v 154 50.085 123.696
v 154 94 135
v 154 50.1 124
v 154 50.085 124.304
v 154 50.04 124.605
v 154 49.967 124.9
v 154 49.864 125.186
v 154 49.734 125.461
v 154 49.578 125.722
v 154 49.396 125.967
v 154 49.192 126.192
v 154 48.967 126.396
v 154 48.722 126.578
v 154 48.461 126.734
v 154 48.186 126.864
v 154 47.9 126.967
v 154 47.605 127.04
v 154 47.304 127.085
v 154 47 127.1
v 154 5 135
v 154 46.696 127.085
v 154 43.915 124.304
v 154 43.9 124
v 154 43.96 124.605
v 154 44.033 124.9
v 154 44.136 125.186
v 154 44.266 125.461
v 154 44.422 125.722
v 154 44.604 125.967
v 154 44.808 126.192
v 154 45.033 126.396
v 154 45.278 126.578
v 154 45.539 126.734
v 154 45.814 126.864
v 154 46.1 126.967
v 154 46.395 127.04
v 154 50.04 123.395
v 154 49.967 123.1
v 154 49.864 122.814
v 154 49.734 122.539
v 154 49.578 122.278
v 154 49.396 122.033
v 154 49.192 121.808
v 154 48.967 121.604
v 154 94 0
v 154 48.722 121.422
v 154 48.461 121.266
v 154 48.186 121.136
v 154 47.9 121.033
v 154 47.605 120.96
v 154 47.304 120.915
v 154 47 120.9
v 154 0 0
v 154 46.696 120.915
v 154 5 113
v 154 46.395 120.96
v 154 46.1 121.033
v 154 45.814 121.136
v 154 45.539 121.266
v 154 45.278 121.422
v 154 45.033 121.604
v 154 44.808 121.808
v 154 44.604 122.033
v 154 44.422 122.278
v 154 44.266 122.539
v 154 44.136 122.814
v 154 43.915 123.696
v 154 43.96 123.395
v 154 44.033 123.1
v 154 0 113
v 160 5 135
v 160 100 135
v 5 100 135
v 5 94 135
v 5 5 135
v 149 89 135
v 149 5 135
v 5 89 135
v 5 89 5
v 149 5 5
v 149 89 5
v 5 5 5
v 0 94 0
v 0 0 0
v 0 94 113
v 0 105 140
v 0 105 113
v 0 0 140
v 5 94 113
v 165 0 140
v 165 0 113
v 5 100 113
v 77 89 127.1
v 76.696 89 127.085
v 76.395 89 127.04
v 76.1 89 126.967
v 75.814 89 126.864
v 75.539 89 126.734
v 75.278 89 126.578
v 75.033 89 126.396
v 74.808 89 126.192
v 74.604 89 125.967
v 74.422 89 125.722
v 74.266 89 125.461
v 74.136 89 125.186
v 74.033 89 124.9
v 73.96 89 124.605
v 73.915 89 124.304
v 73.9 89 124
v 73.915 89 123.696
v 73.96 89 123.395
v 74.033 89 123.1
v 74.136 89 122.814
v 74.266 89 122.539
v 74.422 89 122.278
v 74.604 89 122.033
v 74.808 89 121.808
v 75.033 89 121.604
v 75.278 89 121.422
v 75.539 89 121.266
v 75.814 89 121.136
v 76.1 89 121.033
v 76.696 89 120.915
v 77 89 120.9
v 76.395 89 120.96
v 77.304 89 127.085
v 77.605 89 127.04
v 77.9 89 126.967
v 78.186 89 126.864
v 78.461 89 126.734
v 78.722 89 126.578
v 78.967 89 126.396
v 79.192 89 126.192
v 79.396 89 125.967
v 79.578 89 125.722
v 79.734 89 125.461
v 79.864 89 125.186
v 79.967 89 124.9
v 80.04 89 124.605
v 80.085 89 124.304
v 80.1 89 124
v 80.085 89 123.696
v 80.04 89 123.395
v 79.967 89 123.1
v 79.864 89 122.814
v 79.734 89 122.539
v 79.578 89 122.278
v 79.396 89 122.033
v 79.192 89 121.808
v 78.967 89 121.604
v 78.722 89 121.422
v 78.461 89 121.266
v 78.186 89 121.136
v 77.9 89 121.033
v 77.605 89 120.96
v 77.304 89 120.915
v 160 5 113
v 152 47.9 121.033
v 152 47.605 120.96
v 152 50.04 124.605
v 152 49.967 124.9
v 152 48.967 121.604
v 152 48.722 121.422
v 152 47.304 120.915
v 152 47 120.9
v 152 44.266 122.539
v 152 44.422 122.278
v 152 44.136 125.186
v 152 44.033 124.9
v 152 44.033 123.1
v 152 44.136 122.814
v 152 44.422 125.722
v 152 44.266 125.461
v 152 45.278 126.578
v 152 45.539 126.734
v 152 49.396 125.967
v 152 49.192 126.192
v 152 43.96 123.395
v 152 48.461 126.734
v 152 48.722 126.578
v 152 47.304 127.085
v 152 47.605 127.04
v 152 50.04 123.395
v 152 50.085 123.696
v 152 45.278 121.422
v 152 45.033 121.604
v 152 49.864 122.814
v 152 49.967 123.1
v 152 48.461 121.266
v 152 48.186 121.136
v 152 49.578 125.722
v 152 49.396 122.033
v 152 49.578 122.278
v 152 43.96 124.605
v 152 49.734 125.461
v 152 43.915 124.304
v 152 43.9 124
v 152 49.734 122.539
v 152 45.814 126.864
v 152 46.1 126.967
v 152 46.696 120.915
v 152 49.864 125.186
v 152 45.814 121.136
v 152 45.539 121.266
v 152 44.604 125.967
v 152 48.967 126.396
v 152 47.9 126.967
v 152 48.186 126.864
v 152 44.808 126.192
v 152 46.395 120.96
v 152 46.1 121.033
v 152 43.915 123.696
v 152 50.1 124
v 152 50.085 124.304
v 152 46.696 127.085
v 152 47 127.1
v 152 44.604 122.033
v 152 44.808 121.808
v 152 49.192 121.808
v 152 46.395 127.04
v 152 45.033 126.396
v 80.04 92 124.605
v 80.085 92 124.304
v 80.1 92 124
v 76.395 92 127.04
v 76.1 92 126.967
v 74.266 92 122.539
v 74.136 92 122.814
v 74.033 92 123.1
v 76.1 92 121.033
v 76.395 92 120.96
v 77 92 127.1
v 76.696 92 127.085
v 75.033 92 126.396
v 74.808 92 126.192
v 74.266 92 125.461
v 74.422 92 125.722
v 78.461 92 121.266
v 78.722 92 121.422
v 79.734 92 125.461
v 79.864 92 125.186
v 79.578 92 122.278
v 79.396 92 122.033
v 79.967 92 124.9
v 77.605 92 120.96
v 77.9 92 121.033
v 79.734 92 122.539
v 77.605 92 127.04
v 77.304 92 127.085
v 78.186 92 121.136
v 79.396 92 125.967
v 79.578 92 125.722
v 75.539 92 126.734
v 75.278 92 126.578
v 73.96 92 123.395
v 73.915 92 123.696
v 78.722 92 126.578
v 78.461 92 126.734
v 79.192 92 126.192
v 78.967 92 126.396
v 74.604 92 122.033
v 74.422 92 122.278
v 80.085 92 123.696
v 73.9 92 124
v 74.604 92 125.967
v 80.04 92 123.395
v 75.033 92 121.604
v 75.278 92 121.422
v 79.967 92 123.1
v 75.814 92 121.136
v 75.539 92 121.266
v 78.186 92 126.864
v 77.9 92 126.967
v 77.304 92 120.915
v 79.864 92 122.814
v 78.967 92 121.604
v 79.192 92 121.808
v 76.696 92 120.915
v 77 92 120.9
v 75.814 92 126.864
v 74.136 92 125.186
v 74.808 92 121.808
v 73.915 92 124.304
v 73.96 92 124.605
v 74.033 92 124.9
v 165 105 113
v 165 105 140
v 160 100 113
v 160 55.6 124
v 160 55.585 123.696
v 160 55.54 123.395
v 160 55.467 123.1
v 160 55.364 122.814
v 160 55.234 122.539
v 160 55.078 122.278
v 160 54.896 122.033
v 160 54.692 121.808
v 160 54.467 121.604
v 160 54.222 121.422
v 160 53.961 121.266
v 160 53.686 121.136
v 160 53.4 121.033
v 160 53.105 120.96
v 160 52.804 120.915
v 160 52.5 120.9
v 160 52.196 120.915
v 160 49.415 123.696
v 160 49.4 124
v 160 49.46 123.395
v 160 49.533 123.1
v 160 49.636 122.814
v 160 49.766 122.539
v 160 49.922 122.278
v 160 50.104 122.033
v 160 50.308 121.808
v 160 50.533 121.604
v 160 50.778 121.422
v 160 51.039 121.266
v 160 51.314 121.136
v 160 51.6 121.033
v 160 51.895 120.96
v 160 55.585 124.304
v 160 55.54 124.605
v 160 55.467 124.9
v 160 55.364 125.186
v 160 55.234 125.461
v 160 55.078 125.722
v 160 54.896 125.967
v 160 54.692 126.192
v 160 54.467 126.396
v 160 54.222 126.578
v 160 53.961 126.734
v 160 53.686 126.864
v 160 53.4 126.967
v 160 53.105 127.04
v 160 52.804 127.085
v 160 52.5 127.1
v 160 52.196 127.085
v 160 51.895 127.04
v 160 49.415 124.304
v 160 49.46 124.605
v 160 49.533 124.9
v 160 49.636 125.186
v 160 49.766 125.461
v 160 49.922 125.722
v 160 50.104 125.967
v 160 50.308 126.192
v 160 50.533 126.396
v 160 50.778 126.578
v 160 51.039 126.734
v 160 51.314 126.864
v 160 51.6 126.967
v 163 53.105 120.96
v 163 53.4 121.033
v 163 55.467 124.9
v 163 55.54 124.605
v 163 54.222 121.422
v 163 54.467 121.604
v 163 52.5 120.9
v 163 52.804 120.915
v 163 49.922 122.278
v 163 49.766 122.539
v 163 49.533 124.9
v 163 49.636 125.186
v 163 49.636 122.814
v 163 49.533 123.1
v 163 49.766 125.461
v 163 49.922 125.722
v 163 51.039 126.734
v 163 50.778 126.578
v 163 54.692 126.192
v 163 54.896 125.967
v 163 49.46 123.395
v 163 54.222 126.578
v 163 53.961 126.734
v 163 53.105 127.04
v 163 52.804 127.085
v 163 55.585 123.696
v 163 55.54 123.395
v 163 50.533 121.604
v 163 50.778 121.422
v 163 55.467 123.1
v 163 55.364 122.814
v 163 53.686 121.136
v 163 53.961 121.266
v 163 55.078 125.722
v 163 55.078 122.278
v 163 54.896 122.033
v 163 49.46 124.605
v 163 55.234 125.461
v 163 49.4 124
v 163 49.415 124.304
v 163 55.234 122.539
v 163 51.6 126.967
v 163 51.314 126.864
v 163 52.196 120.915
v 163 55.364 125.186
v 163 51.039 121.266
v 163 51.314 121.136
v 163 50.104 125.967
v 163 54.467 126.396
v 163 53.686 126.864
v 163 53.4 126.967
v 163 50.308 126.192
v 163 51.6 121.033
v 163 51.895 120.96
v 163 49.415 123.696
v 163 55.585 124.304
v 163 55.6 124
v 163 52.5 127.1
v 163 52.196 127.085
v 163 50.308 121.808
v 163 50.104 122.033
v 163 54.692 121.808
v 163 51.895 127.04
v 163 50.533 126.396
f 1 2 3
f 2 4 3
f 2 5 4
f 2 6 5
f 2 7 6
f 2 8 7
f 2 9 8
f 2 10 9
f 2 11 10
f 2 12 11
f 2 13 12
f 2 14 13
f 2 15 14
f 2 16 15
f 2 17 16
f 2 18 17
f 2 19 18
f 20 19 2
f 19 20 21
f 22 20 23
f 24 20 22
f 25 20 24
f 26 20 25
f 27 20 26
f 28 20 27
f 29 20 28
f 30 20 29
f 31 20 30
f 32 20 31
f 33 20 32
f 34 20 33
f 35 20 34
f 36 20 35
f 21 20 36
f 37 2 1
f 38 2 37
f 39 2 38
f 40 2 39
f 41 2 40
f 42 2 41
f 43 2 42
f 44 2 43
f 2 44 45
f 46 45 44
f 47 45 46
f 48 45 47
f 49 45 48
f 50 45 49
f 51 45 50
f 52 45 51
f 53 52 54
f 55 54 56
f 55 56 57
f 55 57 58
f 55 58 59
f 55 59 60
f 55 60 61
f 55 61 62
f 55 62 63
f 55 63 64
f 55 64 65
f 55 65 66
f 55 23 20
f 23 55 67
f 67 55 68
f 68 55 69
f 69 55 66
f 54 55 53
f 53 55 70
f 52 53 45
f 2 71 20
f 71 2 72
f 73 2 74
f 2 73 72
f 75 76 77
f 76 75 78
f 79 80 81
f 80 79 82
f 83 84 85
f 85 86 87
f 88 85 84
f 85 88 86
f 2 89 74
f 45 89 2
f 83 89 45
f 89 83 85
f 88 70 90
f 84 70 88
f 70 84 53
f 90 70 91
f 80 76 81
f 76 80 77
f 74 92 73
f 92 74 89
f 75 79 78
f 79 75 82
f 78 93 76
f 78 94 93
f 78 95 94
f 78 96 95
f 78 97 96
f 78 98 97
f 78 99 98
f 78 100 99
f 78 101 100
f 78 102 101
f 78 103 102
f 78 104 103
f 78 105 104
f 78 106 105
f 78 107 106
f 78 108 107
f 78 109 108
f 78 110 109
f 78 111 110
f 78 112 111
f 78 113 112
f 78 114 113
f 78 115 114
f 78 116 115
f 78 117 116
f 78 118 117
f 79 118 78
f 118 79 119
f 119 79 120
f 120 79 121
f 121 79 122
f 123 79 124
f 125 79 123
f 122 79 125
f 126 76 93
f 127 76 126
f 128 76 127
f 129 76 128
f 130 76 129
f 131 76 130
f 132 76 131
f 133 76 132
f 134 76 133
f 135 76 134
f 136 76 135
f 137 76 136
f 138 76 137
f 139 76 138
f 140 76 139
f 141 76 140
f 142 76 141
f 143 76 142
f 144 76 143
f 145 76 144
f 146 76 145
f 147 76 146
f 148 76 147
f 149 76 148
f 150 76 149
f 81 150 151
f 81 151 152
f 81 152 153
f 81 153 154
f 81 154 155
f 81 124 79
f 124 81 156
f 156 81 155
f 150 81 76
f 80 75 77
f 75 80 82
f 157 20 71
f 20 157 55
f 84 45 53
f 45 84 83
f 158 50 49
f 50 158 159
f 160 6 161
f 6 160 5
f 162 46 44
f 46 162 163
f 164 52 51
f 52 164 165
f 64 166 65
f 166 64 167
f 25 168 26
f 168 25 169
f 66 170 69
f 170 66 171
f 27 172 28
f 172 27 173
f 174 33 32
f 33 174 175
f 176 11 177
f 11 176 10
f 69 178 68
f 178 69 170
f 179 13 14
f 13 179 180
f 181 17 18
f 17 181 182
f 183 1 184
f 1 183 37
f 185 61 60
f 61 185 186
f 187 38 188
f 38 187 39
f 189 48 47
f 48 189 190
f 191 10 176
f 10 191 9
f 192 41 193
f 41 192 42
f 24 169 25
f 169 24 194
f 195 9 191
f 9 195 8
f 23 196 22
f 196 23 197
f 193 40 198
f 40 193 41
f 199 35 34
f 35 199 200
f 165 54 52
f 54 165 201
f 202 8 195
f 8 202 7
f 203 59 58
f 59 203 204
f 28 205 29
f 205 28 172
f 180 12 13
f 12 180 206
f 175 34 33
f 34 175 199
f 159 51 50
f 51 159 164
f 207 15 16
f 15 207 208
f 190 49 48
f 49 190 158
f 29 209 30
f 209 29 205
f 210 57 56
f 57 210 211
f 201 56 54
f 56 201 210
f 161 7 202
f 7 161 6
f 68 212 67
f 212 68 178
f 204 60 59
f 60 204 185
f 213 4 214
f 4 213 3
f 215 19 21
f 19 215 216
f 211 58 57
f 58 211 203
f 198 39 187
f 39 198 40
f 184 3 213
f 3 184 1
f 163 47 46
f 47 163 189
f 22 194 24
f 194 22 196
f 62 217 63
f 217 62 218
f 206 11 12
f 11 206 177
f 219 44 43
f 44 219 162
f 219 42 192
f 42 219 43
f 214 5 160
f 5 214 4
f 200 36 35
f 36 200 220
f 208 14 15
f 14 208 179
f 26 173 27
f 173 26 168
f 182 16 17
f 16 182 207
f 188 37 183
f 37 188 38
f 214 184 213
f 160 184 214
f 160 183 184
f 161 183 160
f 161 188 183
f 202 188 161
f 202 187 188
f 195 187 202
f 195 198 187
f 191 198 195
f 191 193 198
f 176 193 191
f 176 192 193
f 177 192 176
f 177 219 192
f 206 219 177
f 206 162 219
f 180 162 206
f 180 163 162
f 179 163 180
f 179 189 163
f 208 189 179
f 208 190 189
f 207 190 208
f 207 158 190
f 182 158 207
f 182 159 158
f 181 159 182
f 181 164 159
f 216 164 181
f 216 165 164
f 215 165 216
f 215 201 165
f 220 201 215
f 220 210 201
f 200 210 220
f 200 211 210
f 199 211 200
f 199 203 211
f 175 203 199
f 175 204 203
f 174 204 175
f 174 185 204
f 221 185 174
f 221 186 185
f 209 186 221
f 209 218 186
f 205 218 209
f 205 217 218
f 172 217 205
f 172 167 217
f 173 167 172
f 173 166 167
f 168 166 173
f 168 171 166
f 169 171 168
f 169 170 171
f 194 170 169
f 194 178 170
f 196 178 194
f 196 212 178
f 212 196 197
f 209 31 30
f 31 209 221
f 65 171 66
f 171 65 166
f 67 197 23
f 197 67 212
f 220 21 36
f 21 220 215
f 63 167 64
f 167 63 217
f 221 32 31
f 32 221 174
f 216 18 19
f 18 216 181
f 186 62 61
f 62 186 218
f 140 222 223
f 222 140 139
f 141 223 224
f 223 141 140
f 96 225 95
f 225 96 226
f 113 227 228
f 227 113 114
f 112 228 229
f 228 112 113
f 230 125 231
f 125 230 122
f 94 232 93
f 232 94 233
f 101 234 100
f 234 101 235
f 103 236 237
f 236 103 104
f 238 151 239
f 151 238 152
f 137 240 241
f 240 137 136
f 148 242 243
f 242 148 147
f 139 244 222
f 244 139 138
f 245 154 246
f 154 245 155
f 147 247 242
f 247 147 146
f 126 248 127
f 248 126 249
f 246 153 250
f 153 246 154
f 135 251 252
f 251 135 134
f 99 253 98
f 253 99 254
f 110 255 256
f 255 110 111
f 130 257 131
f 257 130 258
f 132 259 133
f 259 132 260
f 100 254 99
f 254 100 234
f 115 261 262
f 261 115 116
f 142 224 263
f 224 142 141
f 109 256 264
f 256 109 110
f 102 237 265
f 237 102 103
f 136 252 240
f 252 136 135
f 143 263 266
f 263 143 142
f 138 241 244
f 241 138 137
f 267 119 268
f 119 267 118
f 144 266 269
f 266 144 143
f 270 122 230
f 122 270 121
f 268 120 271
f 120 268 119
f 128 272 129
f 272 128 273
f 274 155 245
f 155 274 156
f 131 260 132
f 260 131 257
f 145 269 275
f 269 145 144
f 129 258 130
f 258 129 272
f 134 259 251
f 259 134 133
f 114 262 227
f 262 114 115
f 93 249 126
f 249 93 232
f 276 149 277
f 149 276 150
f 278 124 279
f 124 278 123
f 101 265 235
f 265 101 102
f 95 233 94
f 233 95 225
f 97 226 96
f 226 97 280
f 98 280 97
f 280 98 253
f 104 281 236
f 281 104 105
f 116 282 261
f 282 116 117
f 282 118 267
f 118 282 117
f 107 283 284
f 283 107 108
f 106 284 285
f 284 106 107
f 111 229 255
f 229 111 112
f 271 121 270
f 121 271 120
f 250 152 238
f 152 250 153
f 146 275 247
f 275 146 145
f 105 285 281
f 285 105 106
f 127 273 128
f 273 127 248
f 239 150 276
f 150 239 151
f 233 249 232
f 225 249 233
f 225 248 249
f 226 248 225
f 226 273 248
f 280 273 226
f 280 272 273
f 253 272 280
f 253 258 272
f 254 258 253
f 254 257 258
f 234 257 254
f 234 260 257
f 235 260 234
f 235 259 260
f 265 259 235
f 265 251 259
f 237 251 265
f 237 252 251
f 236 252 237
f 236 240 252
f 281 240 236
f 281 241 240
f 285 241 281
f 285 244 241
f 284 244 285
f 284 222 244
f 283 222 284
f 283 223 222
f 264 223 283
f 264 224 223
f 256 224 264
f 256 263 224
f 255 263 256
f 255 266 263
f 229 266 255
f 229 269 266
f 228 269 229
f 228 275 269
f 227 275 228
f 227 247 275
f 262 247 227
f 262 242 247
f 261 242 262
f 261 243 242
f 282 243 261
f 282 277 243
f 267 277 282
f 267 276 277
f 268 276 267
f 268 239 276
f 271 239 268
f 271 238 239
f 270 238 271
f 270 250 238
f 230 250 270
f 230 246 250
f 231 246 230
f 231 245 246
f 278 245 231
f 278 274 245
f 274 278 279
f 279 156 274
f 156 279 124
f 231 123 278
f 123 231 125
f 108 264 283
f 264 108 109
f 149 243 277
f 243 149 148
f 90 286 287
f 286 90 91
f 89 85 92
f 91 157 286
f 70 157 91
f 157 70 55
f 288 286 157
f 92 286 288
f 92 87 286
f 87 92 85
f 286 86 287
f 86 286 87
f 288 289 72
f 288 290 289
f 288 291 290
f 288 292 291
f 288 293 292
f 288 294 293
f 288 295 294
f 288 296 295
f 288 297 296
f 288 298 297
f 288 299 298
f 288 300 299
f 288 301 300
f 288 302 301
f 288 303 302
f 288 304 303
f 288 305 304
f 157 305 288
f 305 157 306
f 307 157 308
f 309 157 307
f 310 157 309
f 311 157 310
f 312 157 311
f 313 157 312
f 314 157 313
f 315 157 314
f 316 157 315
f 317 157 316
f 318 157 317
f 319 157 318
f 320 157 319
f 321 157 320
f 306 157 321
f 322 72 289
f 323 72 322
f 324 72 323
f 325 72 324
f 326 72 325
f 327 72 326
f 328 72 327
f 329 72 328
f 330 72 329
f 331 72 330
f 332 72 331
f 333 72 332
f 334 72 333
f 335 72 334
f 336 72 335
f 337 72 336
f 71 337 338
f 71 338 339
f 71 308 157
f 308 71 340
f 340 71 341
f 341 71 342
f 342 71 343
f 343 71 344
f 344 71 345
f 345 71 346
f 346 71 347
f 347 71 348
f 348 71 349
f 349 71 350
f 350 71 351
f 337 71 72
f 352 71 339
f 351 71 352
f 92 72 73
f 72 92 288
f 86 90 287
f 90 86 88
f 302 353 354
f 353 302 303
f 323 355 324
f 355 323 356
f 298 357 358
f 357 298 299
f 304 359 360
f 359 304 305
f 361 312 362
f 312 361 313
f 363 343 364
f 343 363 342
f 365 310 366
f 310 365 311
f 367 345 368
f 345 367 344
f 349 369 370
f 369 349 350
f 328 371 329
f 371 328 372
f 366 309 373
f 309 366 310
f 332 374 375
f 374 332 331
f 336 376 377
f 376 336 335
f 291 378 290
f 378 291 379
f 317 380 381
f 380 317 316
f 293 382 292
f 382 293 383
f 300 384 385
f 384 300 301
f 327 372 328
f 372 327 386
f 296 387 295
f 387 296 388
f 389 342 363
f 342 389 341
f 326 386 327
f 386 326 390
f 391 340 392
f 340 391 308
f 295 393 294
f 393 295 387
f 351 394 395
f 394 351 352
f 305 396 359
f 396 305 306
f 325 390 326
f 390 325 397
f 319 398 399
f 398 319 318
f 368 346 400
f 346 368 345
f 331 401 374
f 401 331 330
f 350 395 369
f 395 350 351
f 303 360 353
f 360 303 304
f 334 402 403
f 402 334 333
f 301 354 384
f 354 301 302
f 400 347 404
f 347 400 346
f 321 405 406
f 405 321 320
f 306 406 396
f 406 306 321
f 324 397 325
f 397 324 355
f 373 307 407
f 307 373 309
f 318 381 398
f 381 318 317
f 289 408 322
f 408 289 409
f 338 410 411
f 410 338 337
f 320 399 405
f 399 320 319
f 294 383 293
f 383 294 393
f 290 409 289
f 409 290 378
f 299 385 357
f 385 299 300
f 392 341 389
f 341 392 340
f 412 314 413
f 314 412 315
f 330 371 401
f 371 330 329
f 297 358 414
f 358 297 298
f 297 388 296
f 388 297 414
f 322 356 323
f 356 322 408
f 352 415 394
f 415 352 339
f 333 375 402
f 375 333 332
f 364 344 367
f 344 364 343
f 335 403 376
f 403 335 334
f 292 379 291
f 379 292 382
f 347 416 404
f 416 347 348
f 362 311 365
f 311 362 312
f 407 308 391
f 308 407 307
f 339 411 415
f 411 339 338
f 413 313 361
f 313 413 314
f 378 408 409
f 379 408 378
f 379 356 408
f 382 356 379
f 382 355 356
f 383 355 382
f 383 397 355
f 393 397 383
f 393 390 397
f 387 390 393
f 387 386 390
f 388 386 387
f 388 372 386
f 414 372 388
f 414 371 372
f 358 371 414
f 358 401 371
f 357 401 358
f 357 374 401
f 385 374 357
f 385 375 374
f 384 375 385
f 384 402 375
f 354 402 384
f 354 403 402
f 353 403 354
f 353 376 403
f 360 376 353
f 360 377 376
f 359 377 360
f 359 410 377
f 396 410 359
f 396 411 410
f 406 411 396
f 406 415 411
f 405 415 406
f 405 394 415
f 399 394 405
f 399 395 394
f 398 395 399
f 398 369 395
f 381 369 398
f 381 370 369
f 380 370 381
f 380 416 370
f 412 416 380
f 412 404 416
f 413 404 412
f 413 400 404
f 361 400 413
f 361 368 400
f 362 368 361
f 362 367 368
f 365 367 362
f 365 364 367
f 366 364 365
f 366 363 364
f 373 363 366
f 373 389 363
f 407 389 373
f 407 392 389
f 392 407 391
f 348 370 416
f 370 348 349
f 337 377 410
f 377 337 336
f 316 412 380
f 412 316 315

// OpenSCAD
// =============================================================================
//  Pokemon Booster Box Display Case  --  magnetic slip-on cap lid
//  Parametric OpenSCAD model.  Units: millimetres.
//
//  HOW TO USE
//    1. Measure your sealed booster box (outer cardboard, in mm).
//    2. Put those three numbers in BOX_W / BOX_D / BOX_H below.
//    3. Press F5 to preview, F6 to render.  The console echoes the cut list.
//
//  See ../SPEC.md for the matching written spec and ../cut-plan.svg for the
//  flat sheet layout.
// =============================================================================

/* [Booster box - MEASURE YOURS] */
BOX_W = 140;    // width  (X)
BOX_D =  80;    // depth  (Y)
BOX_H = 125;    // height (Z)

/* [Clearance] */
FIT       = 2.0;   // air each side of the booster box
HEAD      = 5.0;   // headroom above the booster box
LID_CLR   = 0.5;   // lid-to-body clearance, each side

/* [Material] */
t = 5.0;           // acrylic thickness (body walls, bottom, lid)

/* [Lid] */
SKIRT       = 22.0;  // how far the lid skirt drops over the body
SKIRT_SHORT = 0;     // 0 = same as SKIRT; set 18 for a finger reveal on the
                     // two short sides

/* [Magnets] */
MAG_ON       = true;
MAG_DIA      = 6.2;   // pocket diameter (0.2 mm over the magnet)
MAG_DEPTH    = 2.0;   // blind pocket depth -- keep <= t - 3
MAG_INSET    = 11.0;  // pocket centre, measured down from the top rim
MAG_PER_WALL = 1;     // 1 = one centred magnet per wall; 2 = two per wall
MAG_SPREAD   = 40.0;  // centre spacing when MAG_PER_WALL = 2

/* [Details] */
FINGER_NOTCH = false;  // scallop in the body's front top edge
NOTCH_DIA    = 25.0;
NOTCH_DEPTH  = 5.0;

/* [View] */
SHOW_LID     = true;   // draw the lid
SHOW_MAGNETS = false;  // red = body magnets, blue = lid magnets
EXPLODE      = 0;      // mm to lift the lid for a preview render
SHOW_GHOST   = false;  // translucent stand-in for the booster box

$fn = 64;

// ---------------------------------------------------------------- derived ----
Ix  = BOX_W + 2*FIT;          // interior width
Iy  = BOX_D + 2*FIT;          // interior depth
Iz  = BOX_H + HEAD;           // interior height (bottom-panel top -> rim)

Ox  = Ix + 2*t;               // body outer width
Oy  = Iy + 2*t;               // body outer depth
Oz  = t + Iz;                 // body outer height

L_ix = Ox + 2*LID_CLR;        // lid skirt inner width
L_iy = Oy + 2*LID_CLR;        // lid skirt inner depth
L_ox = L_ix + 2*t;            // lid outer width
L_oy = L_iy + 2*t;            // lid outer depth
L_hz = t + SKIRT;             // lid total height

SS    = (SKIRT_SHORT > 0 && SKIRT_SHORT < SKIRT) ? SKIRT_SHORT : SKIRT;
LID_Z = Oz - SKIRT;           // lid origin: skirt bottom sits here

echo(str("Interior         : ", Ix, " x ", Iy, " x ", Iz));
echo(str("Body outer       : ", Ox, " x ", Oy, " x ", Oz));
echo(str("Lid outer        : ", L_ox, " x ", L_oy, " x ", L_hz));
echo(str("Assembled height : ", Oz + t));
echo(str("--- CUT LIST (", t, " mm acrylic) ---"));
echo(str("  Bottom         : ", Ox, " x ", Oy, "   x1"));
echo(str("  Front/back wall: ", Ox, " x ", Iz, "   x2"));
echo(str("  Left/right wall: ", Iy, " x ", Iz, "   x2"));
echo(str("  Lid top        : ", L_ox, " x ", L_oy, "   x1"));
echo(str("  Lid skirt F/B  : ", L_ox, " x ", SKIRT, "   x2"));
echo(str("  Lid skirt L/R  : ", L_iy, " x ", SS, "   x2"));
echo(str("  Magnet pockets : d", MAG_DIA, " x ", MAG_DEPTH, " deep, ",
         4*MAG_PER_WALL, " off, ", MAG_INSET, " mm below the rim"));

// symmetric magnet centre offsets along each wall
function offsets() =
  MAG_PER_WALL <= 1 ? [0]
  : [ for (i = [0 : MAG_PER_WALL-1])
        i*MAG_SPREAD - MAG_SPREAD*(MAG_PER_WALL-1)/2 ];

// magnet centre height
mag_z_body = Oz - MAG_INSET;          // absolute
mag_z_lid  = SKIRT - MAG_INSET;       // local, "down from the skirt's top edge"

// ------------------------------------------------------------------ body ----
module body() {
  difference() {
    union() {
      // bottom panel: full footprint, the walls sit on top of it
      cube([Ox, Oy, t]);
      // four walls
      difference() {
        translate([0, 0, t]) cube([Ox, Oy, Iz]);
        translate([t, t, t - 0.01]) cube([Ix, Iy, Iz + 0.02]);
      }
    }

    if (MAG_ON) {
      for (o = offsets()) {
        // +X outer face of the right wall
        translate([Ox - MAG_DEPTH, Oy/2 + o, mag_z_body])
          rotate([0, 90, 0]) cylinder(d = MAG_DIA, h = MAG_DEPTH + 1);
        // -X outer face of the left wall
        translate([MAG_DEPTH, Oy/2 + o, mag_z_body])
          rotate([0, -90, 0]) cylinder(d = MAG_DIA, h = MAG_DEPTH + 1);
        // +Y outer face of the back wall
        translate([Ox/2 + o, Oy - MAG_DEPTH, mag_z_body])
          rotate([90, 0, 0]) cylinder(d = MAG_DIA, h = MAG_DEPTH + 1);
        // -Y outer face of the front wall
        translate([Ox/2 + o, MAG_DEPTH, mag_z_body])
          rotate([-90, 0, 0]) cylinder(d = MAG_DIA, h = MAG_DEPTH + 1);
      }
    }

    // optional finger scallop in the front top edge
    if (FINGER_NOTCH) {
      translate([Ox/2, 0, Oz]) rotate([-90, 0, 0])
        cylinder(d = NOTCH_DIA, h = NOTCH_DEPTH);
    }
  }
}

// ------------------------------------------------------------------- lid ----
// Local origin = bottom of the skirt.  Top panel occupies z = SKIRT .. SKIRT+t.
module lid() {
  difference() {
    union() {
      // skirt ring: front/back strips span the full width, side strips sit
      // between them (exactly the cut list in SPEC.md)
      difference() {
        cube([L_ox, L_oy, SKIRT]);
        translate([t, t, -0.01]) cube([L_ix, L_iy, SKIRT + 0.01]);
      }
      // top panel
      translate([0, 0, SKIRT]) cube([L_ox, L_oy, t]);
    }

    // trim the two side skirt strips down to SS (finger reveal)
    if (SS < SKIRT) {
      translate([-0.01, t - 0.01, -0.01]) cube([t + 0.02, L_iy + 0.02, SS + 0.01]);
      translate([L_ox - t - 0.01, t - 0.01, -0.01])
        cube([t + 0.02, L_iy + 0.02, SS + 0.01]);
    }

    if (MAG_ON) {
      for (o = offsets()) {
        // inner face of the left strip (-X)
        translate([t, L_oy/2 + o, mag_z_lid])
          rotate([0, -90, 0]) cylinder(d = MAG_DIA, h = MAG_DEPTH + 1);
        // inner face of the right strip (+X)
        translate([L_ox - t, L_oy/2 + o, mag_z_lid])
          rotate([0, 90, 0]) cylinder(d = MAG_DIA, h = MAG_DEPTH + 1);
        // inner face of the front strip (-Y)
        translate([L_ox/2 + o, t, mag_z_lid])
          rotate([-90, 0, 0]) cylinder(d = MAG_DIA, h = MAG_DEPTH + 1);
        // inner face of the back strip (+Y)
        translate([L_ox/2 + o, L_oy - t, mag_z_lid])
          rotate([90, 0, 0]) cylinder(d = MAG_DIA, h = MAG_DEPTH + 1);
      }
    }
  }
}

// ---------------------------------------------------------------- magnets ---
module magnets() {
  color("crimson") for (o = offsets()) {
    translate([Ox - MAG_DEPTH/2, Oy/2 + o, mag_z_body])
      rotate([0, 90, 0]) cylinder(d = 5.8, h = 1.8, center = true);
    translate([MAG_DEPTH/2, Oy/2 + o, mag_z_body])
      rotate([0, 90, 0]) cylinder(d = 5.8, h = 1.8, center = true);
    translate([Ox/2 + o, Oy - MAG_DEPTH/2, mag_z_body])
      rotate([90, 0, 0]) cylinder(d = 5.8, h = 1.8, center = true);
    translate([Ox/2 + o, MAG_DEPTH/2, mag_z_body])
      rotate([-90, 0, 0]) cylinder(d = 5.8, h = 1.8, center = true);
  }
  color("royalblue") translate([0, 0, LID_Z + EXPLODE]) for (o = offsets()) {
    translate([t + MAG_DEPTH/2, L_oy/2 + o, mag_z_lid])
      rotate([0, 90, 0]) cylinder(d = 5.8, h = 1.8, center = true);
    translate([L_ox - t - MAG_DEPTH/2, L_oy/2 + o, mag_z_lid])
      rotate([0, 90, 0]) cylinder(d = 5.8, h = 1.8, center = true);
    translate([L_ox/2 + o, t + MAG_DEPTH/2, mag_z_lid])
      rotate([90, 0, 0]) cylinder(d = 5.8, h = 1.8, center = true);
    translate([L_ox/2 + o, L_oy - t - MAG_DEPTH/2, mag_z_lid])
      rotate([-90, 0, 0]) cylinder(d = 5.8, h = 1.8, center = true);
  }
}

// -------------------------------------------------------------- assembly ----
module ghost_box() {
  color("orange", 0.25)
    translate([t + FIT, t + FIT, t + FIT]) cube([BOX_W, BOX_D, BOX_H]);
}

body();
if (SHOW_MAGNETS) magnets();
if (SHOW_GHOST)  ghost_box();
if (SHOW_LID) translate([0, 0, LID_Z + EXPLODE]) lid();
